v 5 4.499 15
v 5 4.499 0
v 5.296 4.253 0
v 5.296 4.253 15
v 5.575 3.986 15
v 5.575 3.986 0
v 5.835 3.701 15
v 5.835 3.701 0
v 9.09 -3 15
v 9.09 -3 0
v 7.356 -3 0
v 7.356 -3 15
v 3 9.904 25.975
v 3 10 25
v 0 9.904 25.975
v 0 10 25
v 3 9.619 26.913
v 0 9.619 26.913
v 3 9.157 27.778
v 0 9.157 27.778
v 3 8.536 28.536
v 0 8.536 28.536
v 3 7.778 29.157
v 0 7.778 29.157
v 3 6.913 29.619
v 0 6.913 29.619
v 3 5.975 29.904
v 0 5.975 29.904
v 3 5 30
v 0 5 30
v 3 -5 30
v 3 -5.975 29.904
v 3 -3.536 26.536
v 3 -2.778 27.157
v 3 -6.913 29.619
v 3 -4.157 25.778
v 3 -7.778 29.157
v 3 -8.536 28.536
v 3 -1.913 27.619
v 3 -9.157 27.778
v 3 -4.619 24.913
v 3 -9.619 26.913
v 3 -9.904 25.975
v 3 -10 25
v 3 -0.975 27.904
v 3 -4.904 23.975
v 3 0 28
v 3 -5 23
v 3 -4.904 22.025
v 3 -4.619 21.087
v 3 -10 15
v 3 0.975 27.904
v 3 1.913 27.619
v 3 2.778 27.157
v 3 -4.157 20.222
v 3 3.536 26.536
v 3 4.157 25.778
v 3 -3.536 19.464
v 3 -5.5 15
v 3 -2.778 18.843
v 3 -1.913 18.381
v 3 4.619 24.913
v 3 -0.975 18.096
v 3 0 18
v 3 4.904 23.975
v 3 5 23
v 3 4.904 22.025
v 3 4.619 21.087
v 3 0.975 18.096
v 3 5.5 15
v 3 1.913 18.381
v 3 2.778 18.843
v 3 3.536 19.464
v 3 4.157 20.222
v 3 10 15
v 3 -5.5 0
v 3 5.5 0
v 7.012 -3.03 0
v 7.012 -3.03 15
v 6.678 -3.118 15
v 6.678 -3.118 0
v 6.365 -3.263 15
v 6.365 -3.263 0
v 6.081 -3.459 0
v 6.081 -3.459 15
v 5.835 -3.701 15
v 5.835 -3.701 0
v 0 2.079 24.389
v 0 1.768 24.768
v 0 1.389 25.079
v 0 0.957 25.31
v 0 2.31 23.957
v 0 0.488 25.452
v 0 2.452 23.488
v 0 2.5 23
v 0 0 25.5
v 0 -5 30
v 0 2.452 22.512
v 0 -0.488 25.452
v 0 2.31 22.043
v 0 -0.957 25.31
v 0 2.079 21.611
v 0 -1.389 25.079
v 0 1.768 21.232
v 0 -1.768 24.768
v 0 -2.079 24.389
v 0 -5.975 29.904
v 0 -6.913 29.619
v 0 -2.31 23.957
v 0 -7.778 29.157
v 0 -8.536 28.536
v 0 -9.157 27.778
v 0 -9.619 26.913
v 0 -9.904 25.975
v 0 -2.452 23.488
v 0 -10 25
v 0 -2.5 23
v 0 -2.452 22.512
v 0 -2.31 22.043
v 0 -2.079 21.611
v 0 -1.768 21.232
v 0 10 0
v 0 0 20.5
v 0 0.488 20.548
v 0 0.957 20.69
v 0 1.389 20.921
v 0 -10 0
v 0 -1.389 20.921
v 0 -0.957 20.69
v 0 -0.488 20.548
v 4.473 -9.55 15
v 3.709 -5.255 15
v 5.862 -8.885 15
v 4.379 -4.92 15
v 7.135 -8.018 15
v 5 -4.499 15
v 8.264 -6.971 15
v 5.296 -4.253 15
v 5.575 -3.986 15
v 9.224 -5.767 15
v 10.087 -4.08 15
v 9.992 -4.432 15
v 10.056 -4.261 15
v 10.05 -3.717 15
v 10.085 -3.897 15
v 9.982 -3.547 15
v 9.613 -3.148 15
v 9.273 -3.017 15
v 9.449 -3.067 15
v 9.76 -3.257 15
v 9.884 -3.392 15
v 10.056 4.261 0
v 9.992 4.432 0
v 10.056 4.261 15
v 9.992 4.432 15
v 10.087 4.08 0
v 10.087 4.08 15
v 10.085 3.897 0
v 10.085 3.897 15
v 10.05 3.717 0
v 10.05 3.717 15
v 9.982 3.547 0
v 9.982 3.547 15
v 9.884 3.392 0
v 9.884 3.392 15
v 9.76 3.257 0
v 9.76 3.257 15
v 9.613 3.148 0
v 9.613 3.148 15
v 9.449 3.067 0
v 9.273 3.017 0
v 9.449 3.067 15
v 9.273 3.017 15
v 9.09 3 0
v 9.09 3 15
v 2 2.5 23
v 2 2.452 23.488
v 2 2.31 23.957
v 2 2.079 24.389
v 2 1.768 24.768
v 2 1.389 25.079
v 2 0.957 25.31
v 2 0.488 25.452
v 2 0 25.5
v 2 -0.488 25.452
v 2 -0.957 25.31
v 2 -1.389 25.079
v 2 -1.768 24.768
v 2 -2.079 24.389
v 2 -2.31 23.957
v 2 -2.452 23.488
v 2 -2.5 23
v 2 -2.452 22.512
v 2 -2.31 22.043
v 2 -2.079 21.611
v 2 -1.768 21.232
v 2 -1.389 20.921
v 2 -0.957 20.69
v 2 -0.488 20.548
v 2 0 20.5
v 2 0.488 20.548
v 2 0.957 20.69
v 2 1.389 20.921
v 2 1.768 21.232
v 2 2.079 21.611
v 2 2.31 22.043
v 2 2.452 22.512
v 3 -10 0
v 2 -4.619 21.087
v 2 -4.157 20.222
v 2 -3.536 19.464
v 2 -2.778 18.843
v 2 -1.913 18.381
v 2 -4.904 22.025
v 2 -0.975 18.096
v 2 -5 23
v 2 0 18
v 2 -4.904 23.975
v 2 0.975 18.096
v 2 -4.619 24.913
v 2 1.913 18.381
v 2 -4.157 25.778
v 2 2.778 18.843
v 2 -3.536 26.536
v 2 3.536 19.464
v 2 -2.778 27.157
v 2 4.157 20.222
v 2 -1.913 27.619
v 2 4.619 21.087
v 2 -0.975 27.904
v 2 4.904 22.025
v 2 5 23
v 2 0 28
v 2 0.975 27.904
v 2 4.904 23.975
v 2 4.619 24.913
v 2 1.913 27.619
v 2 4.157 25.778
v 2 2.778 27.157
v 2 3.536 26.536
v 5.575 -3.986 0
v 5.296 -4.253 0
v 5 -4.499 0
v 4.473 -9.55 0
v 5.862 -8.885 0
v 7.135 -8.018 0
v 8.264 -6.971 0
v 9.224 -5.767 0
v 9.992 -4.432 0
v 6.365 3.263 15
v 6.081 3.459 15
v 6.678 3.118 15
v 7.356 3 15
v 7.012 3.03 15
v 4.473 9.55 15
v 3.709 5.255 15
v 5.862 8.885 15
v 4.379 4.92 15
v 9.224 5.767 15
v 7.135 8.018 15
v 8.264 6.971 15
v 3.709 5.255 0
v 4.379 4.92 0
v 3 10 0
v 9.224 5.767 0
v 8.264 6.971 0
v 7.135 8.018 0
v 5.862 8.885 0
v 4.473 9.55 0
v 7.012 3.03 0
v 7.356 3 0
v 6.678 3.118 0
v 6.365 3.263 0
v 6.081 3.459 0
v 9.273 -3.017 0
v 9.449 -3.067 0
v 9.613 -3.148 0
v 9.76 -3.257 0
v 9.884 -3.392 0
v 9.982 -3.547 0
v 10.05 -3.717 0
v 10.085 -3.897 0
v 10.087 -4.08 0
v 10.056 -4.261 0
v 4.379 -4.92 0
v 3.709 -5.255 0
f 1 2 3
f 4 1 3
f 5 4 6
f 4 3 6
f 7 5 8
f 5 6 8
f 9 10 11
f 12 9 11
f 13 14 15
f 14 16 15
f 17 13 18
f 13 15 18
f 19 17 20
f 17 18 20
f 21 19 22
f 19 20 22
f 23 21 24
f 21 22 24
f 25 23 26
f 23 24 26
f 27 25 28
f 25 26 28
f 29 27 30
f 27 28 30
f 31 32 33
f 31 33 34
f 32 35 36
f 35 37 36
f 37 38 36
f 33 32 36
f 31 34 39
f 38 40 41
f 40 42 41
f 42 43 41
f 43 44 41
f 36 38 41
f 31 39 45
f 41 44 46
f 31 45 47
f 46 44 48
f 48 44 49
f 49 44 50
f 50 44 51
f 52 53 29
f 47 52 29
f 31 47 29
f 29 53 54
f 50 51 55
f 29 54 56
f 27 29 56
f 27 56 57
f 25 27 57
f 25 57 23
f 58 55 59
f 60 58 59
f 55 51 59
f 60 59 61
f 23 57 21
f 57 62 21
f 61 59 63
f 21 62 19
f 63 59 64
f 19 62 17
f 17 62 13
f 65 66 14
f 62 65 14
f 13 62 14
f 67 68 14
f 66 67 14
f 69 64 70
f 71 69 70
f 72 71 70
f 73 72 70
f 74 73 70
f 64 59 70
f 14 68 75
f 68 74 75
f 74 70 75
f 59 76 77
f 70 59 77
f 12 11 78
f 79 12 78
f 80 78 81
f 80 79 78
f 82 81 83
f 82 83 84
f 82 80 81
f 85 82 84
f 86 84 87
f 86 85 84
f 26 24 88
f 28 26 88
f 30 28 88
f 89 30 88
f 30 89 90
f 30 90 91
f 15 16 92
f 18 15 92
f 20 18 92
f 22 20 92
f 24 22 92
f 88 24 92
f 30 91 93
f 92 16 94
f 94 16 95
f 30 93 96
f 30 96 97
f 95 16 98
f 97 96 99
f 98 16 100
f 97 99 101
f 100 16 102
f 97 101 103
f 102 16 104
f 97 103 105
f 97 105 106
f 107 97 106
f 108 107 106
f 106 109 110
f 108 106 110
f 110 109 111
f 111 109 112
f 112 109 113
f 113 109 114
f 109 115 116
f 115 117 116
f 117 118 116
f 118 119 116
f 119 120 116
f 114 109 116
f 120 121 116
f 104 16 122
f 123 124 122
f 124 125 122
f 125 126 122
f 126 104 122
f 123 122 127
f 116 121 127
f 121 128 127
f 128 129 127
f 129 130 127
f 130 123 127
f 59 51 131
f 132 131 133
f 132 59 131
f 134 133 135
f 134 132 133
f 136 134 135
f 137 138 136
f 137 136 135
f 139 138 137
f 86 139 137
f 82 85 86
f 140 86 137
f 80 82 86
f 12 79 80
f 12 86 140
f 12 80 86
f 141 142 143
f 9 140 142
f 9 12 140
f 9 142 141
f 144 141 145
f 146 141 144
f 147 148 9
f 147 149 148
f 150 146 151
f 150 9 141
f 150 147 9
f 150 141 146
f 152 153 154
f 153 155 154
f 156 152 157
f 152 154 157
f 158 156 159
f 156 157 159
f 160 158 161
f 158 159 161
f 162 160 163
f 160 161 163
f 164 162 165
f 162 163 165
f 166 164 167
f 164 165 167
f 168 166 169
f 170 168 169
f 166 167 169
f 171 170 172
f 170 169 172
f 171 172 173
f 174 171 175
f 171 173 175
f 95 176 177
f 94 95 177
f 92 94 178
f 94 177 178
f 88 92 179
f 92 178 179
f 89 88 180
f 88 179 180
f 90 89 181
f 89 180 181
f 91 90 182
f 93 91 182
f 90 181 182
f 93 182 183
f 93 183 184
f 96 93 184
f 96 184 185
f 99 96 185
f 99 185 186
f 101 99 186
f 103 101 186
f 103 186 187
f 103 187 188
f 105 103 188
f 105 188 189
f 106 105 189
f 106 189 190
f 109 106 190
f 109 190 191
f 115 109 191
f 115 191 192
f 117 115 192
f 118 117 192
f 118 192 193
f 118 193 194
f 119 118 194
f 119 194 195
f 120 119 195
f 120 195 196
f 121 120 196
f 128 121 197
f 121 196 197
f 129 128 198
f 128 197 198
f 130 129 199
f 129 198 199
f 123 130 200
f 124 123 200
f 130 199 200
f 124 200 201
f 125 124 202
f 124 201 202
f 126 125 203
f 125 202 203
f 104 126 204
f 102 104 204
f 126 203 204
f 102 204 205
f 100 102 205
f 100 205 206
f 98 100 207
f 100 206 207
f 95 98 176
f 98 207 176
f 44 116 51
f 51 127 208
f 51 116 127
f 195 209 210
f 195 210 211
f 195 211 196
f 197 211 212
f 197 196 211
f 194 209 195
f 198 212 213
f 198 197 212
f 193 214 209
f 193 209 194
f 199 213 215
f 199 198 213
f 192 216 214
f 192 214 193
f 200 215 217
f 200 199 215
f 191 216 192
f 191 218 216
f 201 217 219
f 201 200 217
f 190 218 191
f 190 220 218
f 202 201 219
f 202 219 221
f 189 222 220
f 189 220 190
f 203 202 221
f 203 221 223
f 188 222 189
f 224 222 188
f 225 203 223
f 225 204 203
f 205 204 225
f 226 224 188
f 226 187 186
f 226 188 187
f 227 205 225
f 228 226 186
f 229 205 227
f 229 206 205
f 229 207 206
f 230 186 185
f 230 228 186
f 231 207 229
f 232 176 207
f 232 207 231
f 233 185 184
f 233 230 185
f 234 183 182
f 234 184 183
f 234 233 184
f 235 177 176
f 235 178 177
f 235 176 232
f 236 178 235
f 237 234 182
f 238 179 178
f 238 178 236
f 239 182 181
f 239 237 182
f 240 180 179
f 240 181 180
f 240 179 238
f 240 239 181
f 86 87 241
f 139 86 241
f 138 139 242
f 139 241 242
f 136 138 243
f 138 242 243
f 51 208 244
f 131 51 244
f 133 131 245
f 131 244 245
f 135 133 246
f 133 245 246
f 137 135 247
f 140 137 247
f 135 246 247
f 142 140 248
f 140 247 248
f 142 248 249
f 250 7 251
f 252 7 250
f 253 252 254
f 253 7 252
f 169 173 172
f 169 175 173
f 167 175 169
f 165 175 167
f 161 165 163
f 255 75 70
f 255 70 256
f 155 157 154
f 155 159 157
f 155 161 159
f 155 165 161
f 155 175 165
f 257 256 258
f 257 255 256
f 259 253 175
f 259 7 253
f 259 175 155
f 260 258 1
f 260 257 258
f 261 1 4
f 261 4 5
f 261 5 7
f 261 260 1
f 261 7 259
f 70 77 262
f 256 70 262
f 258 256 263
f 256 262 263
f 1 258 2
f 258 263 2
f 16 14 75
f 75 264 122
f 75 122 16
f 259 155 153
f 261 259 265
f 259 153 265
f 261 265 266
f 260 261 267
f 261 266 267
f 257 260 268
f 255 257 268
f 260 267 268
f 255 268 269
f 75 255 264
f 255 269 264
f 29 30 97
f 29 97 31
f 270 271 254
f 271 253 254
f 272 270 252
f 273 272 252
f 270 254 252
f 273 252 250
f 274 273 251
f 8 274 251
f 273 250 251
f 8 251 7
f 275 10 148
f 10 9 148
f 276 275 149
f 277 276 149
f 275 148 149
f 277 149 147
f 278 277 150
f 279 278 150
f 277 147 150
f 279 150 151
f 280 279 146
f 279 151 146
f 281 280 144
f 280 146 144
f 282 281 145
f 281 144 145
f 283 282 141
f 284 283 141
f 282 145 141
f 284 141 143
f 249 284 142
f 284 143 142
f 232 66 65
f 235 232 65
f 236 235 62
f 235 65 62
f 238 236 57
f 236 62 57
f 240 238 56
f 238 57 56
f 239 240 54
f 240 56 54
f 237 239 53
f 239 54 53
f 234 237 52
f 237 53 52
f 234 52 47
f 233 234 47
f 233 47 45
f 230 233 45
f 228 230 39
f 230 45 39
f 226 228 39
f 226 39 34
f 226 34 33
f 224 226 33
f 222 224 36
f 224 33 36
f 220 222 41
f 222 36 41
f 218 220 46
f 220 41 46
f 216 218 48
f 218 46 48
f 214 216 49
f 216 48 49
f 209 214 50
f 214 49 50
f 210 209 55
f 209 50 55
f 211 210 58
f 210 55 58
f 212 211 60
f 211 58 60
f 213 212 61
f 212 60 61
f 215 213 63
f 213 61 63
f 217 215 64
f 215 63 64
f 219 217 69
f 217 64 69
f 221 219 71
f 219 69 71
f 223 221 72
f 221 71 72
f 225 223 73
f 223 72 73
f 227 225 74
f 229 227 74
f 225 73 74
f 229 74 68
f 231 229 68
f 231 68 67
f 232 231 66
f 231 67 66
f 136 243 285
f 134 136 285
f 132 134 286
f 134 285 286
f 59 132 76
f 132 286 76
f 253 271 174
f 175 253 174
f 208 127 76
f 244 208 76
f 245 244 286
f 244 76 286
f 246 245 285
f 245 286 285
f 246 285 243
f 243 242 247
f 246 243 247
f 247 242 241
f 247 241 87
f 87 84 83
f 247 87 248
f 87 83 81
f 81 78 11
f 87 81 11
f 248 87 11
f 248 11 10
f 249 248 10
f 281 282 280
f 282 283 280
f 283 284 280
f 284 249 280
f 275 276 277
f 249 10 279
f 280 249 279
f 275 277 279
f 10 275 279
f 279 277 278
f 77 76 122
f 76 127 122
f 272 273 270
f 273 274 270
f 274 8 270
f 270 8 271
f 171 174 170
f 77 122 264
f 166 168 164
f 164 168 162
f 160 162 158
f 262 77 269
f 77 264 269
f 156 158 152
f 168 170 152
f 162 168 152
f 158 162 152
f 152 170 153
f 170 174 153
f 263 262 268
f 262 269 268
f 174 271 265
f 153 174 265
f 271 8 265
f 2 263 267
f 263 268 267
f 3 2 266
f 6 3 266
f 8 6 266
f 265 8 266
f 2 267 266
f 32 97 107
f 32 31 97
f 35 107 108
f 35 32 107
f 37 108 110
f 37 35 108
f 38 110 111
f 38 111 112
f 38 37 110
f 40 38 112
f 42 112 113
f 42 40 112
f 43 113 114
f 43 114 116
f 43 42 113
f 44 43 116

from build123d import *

# Parameters (mm, degrees)
F1_DEPTH = 30
F2_DEPTH = 15
F3_R     = 2.5
F4_DEPTH = 25
F5_R     = 5
F3_R_2   = 5
F6_DEPTH = 1
F7_R     = 2
F8_R     = 1


with BuildPart() as f1:
    # F0 (on Top) → F1 (new body)
    with BuildSketch(Plane.XY):
        Polygon((3, 10), (0, 10), (0, -10), (3, -10), (3, -5.5), (3, 5.5), align=None)
    extrude(amount=F1_DEPTH)

    # F0 (on Top) → F2 (join)
    with BuildSketch(Plane.XY):
        with BuildLine():
            ThreePointArc((10.551148, 3), (7.718324, 7.516978), (3, 10))
            Line((3, 10), (3, 5.5))
            Line((3, 5.5), (5, 5.5))
            Line((5, 5.5), (5, 4.499471))
            ThreePointArc((5, 4.499471), (5.740219, 3.809727), (6.346858, 3))
            Line((6.346858, 3), (10.551148, 3))
        make_face()
        with BuildLine():
            Line((3, -5.5), (3, -10))
            ThreePointArc((3, -10), (7.718324, -7.516978), (10.551148, -3))
            Line((10.551148, -3), (6.346858, -3))
            ThreePointArc((6.346858, -3), (5.740219, -3.809727), (5, -4.499471))
            Line((5, -4.499471), (5, -5.5))
            Line((5, -5.5), (3, -5.5))
        make_face()
        with BuildLine():
            Line((5, 5.5), (3, 5.5))
            ThreePointArc((3, 5.5), (4.049539, 5.09876), (5, 4.499471))
            Line((5, 4.499471), (5, 5.5))
        make_face()
        with BuildLine():
            ThreePointArc((5, -4.499471), (4.049539, -5.09876), (3, -5.5))
            Line((3, -5.5), (5, -5.5))
            Line((5, -5.5), (5, -4.499471))
        make_face()
    extrude(amount=F2_DEPTH)

    # F3 (on face) → F4 (cut)
    with BuildSketch(Plane.YZ.offset(3)):
        with Locations((0, 23)):
            Circle(F3_R)
    extrude(amount=-F4_DEPTH, mode=Mode.SUBTRACT)

    # F5
    f5_edges = [f1.edges().sort_by_distance(p)[0] for p in [
        (1.5, -10, 30),
        (1.5, 10, 30),
    ]]
    fillet(f5_edges, radius=F5_R)

    # F3 (on face) → F6 (cut)
    with BuildSketch(Plane.YZ.offset(3)):
        with Locations((0, 23)):
            Circle(F3_R_2)
        with Locations((0, 23)):
            Circle(F3_R, mode=Mode.SUBTRACT)
    extrude(amount=-F6_DEPTH, mode=Mode.SUBTRACT)

    # F7
    f7_edges = [f1.edges().sort_by_distance(p)[0] for p in [
        (6.346858, -3, 7.5),
        (6.346858, 3, 7.5),
    ]]
    fillet(f7_edges, radius=F7_R)

    # F8
    f8_edges = [f1.edges().sort_by_distance(p)[0] for p in [
        (10.551148, -3, 7.5),
        (10.551148, 3, 7.5),
    ]]
    fillet(f8_edges, radius=F8_R)


solid = f1.part
